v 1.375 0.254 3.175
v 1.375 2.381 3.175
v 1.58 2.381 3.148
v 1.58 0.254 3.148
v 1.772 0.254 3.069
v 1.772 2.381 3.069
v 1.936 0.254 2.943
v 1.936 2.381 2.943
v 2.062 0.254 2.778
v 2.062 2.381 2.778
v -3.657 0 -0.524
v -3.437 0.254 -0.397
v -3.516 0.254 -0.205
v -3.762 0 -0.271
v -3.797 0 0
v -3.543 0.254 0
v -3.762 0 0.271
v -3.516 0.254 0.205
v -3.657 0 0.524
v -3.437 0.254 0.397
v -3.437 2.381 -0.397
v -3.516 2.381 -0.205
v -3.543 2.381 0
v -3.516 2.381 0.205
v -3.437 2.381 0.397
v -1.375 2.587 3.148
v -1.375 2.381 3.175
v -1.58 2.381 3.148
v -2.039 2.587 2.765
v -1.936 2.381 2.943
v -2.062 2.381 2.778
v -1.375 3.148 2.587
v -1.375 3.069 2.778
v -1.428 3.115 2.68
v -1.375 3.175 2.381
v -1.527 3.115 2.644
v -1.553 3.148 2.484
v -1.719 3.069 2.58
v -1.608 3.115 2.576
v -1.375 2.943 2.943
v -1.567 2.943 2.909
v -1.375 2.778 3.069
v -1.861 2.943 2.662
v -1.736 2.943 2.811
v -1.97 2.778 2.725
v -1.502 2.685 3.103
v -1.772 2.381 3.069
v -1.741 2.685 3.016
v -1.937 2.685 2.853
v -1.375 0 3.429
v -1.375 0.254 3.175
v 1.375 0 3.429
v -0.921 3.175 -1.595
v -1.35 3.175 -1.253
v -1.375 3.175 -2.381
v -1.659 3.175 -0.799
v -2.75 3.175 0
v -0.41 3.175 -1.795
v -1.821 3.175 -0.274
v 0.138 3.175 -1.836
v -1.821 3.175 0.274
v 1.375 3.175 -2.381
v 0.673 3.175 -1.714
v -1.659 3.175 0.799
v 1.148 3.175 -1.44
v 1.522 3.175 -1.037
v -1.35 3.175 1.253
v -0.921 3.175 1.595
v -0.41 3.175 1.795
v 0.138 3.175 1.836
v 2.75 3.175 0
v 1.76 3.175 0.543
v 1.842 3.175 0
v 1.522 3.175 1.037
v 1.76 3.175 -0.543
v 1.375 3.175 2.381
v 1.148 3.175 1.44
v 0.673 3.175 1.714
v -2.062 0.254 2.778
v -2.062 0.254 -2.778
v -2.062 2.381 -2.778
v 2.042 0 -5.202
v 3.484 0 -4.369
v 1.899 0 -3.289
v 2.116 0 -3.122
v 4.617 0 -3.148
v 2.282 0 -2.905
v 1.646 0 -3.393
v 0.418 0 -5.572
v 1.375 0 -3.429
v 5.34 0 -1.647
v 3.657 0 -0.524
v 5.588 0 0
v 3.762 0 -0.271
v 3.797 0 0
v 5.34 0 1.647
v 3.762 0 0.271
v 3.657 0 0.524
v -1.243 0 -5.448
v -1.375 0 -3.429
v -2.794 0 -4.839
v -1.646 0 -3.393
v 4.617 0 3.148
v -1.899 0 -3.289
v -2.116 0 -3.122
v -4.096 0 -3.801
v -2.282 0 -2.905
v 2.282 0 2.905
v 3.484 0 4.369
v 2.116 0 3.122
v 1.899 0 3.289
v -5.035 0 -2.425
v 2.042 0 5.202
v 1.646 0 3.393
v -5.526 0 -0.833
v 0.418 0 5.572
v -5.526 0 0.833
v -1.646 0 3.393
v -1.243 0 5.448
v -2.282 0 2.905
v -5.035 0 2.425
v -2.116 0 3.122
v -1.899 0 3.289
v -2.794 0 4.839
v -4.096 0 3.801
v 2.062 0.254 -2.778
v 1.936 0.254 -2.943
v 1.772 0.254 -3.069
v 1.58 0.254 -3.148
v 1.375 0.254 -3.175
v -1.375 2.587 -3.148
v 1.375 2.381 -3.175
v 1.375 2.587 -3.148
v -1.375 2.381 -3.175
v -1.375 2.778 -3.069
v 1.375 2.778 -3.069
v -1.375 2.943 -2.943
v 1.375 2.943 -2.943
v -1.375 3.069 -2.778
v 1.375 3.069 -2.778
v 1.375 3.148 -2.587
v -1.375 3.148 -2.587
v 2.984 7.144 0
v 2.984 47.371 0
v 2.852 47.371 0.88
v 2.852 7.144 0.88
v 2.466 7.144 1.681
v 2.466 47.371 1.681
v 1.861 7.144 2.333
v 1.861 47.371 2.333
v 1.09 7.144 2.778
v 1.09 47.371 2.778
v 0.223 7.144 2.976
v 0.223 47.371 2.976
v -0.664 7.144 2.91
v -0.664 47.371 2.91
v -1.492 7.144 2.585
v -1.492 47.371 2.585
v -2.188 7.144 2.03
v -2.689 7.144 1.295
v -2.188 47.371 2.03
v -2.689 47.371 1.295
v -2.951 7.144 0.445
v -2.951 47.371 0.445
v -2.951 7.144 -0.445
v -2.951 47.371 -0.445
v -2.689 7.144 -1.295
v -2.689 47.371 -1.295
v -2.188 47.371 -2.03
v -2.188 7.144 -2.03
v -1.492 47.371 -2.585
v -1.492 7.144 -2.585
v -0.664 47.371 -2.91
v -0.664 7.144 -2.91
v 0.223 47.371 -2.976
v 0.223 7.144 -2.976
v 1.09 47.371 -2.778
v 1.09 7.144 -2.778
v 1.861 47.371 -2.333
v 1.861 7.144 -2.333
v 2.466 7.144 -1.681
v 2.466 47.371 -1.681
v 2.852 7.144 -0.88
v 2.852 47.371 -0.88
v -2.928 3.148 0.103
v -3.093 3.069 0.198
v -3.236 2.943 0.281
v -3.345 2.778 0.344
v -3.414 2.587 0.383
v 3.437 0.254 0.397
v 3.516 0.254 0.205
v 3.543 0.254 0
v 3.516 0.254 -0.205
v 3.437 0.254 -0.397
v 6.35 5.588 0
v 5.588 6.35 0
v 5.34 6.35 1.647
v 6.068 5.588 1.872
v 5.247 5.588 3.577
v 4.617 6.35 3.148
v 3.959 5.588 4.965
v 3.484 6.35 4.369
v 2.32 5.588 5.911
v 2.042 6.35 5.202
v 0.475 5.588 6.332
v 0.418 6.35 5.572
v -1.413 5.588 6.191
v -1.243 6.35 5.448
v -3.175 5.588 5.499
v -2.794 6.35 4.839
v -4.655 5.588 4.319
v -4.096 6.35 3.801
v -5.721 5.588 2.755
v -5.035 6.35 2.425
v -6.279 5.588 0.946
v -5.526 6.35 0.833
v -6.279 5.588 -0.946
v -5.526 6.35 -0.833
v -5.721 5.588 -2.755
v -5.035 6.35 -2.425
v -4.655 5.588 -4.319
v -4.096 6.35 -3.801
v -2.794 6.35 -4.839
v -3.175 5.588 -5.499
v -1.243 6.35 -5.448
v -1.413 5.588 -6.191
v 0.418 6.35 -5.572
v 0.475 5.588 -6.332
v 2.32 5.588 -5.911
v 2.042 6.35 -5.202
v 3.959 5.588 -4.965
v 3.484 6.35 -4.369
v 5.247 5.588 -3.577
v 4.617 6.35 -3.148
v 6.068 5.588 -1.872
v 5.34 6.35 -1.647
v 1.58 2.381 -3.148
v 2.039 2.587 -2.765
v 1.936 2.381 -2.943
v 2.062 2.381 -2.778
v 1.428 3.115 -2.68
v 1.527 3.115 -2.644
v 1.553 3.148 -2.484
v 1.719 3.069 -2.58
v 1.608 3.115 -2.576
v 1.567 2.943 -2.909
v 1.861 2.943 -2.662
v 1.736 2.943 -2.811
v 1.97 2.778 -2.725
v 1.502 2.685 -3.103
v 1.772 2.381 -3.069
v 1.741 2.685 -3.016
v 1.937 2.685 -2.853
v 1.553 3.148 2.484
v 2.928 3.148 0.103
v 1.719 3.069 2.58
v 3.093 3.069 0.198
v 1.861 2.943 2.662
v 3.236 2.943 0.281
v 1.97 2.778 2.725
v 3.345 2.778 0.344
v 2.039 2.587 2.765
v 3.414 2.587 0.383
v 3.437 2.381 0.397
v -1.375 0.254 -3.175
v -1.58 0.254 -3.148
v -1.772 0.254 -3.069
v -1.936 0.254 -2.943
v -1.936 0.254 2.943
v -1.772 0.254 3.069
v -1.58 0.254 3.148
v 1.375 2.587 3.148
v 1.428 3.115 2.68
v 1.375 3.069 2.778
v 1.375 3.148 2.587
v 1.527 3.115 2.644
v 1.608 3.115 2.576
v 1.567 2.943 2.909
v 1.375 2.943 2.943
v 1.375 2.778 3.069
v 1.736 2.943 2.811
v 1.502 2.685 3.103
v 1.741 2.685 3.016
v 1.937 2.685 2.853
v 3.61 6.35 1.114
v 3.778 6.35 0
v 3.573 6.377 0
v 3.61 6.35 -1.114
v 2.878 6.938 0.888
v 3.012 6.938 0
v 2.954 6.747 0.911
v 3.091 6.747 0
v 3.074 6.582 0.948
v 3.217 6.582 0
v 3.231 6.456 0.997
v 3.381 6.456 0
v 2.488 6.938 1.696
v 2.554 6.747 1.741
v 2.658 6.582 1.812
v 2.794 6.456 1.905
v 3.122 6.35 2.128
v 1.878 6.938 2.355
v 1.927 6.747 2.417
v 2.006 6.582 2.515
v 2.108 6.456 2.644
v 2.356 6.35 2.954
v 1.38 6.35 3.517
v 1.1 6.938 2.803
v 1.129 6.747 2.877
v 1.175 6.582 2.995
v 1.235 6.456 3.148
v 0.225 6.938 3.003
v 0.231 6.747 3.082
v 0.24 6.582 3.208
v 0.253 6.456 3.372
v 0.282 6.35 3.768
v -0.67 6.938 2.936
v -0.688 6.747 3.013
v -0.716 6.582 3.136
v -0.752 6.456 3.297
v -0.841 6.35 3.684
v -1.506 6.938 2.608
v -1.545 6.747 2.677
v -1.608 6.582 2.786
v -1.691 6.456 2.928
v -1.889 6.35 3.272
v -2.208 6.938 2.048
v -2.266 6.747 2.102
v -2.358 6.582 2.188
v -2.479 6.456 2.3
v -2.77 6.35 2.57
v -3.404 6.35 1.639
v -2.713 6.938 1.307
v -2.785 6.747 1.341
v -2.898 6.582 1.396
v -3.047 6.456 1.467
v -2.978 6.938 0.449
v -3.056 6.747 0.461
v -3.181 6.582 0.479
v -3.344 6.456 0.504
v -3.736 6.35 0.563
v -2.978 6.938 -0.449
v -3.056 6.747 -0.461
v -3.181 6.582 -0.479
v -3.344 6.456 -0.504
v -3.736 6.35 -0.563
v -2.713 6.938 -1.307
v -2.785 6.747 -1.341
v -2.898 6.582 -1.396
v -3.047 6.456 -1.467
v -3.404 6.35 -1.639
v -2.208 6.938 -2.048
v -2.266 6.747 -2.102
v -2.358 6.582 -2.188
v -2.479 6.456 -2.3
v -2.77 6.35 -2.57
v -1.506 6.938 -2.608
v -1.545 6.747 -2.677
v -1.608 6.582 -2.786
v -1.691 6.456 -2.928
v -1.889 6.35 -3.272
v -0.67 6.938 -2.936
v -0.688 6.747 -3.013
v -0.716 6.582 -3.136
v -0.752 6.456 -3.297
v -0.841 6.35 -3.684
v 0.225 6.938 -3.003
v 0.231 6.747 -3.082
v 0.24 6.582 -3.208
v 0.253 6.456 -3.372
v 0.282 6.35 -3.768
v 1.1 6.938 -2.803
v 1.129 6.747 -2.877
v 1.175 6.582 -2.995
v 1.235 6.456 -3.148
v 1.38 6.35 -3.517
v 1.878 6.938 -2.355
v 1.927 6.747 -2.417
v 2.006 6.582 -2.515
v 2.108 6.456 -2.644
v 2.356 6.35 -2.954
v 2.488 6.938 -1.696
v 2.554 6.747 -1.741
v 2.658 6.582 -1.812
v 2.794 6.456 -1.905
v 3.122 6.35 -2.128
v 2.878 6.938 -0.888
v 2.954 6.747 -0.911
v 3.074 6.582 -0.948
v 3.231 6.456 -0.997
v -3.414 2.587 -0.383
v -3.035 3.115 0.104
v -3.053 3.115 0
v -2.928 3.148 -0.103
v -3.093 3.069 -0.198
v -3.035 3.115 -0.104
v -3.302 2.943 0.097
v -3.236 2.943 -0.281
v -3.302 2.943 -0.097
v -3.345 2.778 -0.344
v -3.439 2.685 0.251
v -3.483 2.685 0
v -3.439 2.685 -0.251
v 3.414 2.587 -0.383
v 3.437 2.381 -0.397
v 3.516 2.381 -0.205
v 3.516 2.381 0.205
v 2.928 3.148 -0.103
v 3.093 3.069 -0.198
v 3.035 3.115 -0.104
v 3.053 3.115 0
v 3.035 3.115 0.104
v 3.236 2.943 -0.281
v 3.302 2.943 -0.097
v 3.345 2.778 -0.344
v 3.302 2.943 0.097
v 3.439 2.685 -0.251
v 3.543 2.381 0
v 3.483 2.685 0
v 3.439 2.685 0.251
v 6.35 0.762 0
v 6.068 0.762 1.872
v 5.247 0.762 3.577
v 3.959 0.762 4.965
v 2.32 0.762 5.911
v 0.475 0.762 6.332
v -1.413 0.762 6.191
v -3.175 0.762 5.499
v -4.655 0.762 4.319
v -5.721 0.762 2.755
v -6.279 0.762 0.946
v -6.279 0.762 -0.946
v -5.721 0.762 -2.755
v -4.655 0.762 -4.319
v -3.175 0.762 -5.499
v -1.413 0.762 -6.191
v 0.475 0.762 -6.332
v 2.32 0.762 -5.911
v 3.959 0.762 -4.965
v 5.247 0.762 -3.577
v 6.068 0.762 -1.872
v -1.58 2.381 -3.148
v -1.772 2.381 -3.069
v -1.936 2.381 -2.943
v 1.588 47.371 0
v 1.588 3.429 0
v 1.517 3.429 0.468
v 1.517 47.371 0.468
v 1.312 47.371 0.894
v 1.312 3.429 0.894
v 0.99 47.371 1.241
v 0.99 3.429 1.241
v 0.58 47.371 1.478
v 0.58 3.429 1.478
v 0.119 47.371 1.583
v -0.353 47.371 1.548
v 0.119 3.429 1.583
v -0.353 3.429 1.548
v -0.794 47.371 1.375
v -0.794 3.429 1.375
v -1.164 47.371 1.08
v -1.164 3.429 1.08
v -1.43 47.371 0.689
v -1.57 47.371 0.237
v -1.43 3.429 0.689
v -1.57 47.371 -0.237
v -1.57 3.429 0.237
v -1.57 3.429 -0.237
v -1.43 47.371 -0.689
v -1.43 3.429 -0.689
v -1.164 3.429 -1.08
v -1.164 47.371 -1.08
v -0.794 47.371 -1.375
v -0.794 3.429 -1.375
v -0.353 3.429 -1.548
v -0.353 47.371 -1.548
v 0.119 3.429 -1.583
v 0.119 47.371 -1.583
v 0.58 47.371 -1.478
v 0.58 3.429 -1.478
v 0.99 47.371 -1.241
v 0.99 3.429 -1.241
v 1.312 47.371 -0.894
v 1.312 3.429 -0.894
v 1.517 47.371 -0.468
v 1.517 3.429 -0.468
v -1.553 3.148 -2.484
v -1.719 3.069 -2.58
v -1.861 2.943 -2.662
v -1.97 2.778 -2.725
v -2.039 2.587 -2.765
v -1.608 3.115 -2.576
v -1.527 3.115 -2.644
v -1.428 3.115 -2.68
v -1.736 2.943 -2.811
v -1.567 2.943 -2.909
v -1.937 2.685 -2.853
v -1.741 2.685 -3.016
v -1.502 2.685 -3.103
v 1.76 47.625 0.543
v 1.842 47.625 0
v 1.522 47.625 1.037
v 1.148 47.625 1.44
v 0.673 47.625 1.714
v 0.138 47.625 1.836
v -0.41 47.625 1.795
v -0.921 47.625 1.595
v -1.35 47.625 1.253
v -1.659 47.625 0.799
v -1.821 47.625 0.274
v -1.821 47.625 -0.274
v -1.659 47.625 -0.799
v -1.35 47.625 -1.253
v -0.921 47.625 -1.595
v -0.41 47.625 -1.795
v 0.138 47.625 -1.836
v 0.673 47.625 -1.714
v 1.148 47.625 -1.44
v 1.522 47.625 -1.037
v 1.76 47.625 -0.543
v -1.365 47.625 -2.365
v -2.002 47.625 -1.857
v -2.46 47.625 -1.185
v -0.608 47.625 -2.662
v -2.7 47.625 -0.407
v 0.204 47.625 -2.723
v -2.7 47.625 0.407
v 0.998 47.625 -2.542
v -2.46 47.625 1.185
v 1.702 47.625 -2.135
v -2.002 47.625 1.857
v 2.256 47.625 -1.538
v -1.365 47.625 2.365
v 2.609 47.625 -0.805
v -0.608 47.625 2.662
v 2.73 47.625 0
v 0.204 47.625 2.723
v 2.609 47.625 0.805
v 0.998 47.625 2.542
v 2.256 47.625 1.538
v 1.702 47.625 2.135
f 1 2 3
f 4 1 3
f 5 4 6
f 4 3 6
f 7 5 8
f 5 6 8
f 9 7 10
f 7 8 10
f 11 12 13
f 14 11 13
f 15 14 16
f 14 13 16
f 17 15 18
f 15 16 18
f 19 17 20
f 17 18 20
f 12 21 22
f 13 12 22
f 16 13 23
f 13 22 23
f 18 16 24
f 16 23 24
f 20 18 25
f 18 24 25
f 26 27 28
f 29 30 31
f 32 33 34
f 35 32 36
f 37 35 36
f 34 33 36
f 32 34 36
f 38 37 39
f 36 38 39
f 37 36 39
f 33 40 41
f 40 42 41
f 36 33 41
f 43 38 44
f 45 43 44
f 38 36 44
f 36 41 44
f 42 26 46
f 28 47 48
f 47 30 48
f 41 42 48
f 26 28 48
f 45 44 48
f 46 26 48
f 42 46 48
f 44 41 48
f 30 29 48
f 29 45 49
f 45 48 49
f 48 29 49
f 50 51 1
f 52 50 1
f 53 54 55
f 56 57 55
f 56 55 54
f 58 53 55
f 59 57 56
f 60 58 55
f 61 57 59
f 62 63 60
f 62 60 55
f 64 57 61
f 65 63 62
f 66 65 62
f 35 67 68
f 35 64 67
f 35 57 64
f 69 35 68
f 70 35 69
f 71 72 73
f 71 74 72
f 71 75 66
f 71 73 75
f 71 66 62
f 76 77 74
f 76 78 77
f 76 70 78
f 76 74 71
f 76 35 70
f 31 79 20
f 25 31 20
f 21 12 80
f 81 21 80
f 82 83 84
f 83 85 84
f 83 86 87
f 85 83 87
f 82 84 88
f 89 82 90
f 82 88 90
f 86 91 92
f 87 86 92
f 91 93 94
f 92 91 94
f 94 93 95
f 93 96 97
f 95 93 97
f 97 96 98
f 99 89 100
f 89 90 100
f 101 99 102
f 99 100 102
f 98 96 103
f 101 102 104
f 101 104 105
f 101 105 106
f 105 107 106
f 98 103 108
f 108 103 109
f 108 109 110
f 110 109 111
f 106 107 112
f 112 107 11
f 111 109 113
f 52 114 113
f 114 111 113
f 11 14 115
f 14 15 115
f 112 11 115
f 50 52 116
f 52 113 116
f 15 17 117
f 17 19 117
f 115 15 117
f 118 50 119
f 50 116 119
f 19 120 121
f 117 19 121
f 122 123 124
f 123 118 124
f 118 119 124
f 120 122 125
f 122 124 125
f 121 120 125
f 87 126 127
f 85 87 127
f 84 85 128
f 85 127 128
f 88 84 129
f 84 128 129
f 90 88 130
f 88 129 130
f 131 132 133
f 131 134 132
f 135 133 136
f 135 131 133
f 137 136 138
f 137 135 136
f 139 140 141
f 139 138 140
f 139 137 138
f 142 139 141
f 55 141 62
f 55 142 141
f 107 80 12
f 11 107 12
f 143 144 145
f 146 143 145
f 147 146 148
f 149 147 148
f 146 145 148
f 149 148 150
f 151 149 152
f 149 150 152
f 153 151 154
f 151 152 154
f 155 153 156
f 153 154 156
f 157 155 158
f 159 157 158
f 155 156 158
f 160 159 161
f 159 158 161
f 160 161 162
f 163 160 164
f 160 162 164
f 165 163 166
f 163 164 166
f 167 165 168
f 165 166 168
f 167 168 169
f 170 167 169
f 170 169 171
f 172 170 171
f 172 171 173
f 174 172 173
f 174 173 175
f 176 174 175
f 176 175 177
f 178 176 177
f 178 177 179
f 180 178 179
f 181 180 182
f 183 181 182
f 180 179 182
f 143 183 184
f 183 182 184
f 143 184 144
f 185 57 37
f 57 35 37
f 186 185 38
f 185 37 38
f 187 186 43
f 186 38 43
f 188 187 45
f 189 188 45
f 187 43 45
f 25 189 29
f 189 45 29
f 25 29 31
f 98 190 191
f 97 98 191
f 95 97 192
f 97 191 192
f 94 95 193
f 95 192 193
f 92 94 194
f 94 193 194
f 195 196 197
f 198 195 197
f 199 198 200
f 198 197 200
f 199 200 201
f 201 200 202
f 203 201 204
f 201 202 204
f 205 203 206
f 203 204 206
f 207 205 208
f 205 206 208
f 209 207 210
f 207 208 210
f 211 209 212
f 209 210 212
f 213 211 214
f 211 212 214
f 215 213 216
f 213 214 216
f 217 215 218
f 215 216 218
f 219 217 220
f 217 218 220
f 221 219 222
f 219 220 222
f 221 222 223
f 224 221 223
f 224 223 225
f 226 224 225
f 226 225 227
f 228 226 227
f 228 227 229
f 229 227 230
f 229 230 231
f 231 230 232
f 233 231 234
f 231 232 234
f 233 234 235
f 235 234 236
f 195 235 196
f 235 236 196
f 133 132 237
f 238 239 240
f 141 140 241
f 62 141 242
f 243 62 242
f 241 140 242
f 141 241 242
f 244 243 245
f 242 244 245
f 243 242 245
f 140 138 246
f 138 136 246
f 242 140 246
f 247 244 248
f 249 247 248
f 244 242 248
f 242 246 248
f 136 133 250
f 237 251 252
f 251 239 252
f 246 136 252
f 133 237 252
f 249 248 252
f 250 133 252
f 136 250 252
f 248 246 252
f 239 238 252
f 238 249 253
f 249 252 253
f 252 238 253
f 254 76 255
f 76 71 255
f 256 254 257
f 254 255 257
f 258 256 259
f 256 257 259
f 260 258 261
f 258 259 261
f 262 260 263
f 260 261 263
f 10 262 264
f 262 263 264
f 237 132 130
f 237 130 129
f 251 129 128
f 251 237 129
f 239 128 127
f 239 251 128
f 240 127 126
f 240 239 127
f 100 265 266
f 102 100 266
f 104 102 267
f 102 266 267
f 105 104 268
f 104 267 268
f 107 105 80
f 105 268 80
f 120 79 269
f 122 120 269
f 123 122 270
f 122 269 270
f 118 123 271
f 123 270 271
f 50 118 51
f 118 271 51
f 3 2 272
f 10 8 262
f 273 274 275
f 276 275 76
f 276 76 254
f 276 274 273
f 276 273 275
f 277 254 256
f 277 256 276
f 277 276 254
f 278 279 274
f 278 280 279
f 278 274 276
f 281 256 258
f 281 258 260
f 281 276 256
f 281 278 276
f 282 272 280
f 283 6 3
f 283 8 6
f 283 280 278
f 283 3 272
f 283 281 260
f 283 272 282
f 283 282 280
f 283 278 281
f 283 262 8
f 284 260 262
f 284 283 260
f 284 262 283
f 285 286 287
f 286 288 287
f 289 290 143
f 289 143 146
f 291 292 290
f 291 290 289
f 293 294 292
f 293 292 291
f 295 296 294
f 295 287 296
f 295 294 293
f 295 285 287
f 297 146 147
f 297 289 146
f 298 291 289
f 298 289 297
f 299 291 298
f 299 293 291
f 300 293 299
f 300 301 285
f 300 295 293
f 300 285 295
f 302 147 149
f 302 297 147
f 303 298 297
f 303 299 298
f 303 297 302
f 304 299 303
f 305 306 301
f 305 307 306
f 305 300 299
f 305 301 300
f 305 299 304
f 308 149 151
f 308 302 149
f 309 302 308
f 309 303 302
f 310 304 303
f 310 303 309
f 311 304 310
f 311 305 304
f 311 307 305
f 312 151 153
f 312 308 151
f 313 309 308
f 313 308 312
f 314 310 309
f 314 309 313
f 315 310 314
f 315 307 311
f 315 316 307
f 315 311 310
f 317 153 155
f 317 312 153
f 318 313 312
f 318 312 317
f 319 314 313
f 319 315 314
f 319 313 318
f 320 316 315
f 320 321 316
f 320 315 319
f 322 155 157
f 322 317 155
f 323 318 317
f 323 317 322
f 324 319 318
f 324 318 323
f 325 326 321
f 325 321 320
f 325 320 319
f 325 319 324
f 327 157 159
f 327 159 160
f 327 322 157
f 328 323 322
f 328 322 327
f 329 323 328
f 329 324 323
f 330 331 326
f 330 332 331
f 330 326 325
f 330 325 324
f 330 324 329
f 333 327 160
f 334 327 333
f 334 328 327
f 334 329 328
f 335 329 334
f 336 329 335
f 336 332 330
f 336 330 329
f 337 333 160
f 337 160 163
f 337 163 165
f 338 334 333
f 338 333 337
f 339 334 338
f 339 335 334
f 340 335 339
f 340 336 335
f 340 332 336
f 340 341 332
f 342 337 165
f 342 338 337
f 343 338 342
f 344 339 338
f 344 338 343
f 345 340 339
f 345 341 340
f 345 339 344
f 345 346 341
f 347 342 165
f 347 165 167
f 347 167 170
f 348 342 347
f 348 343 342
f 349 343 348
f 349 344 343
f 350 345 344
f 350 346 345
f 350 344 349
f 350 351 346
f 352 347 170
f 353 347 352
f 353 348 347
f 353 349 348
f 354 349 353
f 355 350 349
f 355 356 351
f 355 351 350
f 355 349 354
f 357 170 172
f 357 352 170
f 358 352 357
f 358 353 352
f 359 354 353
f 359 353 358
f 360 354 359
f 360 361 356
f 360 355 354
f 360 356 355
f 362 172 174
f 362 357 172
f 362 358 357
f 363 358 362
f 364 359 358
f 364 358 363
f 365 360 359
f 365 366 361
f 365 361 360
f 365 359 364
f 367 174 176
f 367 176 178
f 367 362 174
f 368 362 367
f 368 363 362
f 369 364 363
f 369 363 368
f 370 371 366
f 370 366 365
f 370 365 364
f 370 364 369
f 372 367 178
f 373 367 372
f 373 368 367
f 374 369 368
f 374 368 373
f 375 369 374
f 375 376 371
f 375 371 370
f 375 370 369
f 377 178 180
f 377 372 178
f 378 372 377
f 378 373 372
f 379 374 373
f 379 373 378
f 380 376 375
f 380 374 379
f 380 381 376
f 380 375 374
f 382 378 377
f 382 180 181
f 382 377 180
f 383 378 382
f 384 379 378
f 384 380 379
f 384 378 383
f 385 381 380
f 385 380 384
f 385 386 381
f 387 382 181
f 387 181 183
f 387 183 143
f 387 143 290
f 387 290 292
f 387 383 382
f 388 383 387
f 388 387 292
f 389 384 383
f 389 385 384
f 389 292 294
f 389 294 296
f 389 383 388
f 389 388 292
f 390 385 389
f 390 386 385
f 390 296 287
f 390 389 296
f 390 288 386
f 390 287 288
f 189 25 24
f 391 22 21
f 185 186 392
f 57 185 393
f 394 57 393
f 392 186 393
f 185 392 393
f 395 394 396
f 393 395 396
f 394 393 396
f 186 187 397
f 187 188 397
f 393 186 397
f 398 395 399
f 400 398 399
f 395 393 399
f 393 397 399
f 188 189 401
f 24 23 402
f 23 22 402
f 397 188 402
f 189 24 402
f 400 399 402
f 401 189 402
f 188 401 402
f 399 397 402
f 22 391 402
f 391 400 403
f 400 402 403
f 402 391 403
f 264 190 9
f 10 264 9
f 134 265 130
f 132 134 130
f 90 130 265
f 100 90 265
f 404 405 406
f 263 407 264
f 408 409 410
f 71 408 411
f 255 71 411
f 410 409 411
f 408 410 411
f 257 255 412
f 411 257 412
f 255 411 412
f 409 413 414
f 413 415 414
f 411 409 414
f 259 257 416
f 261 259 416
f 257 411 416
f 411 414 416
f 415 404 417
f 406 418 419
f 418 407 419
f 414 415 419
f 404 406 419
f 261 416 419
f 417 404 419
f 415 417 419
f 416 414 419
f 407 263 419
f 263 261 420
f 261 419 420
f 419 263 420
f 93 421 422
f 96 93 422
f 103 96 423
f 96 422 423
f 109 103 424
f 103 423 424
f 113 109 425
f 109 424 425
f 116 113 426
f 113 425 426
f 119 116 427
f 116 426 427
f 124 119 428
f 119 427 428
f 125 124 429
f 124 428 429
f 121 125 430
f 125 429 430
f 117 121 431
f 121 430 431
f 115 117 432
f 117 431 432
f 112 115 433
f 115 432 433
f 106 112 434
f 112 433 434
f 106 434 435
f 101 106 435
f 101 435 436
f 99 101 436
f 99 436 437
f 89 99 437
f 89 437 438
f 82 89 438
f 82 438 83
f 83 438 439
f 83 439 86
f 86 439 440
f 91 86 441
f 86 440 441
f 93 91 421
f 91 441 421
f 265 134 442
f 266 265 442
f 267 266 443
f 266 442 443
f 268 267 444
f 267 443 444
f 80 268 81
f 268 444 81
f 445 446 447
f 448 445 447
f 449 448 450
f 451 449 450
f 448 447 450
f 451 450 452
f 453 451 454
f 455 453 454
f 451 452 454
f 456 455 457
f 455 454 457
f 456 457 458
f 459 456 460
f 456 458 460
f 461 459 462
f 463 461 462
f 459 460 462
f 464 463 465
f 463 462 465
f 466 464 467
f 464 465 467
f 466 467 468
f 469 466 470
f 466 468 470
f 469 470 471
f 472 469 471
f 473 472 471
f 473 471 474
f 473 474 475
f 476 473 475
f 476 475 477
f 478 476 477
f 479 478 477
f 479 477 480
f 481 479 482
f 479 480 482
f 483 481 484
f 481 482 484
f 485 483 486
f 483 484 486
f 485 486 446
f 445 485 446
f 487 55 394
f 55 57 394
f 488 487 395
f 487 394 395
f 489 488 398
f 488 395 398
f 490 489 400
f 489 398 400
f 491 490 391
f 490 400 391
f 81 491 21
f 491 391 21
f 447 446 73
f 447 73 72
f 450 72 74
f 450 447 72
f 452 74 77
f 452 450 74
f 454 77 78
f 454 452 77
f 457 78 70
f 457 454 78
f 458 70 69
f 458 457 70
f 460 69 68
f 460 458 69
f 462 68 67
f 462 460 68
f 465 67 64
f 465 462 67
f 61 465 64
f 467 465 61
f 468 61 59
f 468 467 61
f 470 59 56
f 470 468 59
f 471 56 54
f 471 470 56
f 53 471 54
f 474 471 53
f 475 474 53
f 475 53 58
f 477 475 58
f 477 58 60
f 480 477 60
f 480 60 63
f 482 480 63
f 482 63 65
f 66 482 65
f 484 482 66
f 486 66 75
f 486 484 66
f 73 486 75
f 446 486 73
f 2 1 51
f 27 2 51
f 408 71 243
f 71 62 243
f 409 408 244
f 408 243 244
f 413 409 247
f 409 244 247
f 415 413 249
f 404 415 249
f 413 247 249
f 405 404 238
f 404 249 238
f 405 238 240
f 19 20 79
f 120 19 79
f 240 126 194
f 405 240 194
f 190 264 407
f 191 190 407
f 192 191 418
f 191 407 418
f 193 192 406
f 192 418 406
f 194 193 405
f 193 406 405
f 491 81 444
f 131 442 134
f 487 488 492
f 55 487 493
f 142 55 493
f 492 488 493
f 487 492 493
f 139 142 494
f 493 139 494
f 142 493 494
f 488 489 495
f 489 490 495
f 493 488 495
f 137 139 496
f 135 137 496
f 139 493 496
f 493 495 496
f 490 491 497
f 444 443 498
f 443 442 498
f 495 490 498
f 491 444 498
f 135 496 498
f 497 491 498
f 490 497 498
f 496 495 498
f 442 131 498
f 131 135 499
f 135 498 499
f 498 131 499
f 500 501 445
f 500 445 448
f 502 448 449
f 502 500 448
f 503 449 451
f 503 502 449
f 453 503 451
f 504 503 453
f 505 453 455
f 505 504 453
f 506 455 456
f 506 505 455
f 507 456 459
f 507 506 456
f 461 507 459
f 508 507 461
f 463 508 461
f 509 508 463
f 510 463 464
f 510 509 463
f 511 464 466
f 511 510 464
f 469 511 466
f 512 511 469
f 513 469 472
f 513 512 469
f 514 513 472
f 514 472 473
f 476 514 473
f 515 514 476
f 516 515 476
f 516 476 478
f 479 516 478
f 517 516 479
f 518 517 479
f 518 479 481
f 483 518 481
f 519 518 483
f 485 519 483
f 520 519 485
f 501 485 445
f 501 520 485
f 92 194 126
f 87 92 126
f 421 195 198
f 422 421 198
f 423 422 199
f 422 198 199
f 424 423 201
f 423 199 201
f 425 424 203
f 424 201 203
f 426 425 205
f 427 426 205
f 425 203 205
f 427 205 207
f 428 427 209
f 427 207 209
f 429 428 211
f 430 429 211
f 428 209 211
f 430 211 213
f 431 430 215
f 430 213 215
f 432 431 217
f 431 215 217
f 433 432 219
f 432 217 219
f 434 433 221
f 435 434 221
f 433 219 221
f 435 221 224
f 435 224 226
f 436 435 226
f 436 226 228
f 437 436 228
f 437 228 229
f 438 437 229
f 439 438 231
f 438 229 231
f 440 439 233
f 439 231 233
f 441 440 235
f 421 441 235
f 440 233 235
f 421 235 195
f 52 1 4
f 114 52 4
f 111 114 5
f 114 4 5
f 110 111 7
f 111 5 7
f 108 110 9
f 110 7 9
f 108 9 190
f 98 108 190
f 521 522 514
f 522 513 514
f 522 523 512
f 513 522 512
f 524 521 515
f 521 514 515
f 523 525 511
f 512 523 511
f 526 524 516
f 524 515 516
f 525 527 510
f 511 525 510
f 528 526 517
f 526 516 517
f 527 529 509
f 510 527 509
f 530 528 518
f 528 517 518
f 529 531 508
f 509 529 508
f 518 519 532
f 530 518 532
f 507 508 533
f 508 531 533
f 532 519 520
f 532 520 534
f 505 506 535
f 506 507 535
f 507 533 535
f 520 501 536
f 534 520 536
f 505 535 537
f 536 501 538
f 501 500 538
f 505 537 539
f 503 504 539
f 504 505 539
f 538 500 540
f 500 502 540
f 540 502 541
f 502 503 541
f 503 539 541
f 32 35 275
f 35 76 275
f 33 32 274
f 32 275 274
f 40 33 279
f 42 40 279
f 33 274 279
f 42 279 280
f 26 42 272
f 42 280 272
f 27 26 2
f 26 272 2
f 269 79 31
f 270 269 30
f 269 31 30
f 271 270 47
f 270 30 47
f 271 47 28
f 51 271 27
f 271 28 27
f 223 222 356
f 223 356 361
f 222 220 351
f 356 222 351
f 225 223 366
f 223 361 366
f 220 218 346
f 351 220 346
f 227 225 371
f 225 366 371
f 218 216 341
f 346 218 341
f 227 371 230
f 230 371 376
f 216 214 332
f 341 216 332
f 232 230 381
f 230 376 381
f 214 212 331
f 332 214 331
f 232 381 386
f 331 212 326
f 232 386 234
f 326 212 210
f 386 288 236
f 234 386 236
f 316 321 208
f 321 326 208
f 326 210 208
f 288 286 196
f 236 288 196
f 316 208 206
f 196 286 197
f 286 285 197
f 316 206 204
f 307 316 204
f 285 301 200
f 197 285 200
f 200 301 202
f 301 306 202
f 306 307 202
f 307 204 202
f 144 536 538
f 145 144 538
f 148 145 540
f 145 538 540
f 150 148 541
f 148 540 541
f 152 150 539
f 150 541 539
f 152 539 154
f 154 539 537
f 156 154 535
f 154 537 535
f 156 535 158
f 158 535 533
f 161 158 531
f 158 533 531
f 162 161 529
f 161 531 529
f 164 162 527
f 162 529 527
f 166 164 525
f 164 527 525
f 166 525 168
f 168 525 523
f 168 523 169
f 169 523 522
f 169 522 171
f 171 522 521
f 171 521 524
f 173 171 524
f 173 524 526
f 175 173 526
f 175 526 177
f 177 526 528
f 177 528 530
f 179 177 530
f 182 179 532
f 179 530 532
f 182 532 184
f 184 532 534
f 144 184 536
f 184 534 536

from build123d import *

# Parameters (mm, degrees)
CUT_EXTRUDE1_DEPTH = 3.175
FILLET1_R          = 0.79375
CHAMFER1_SIZE      = 0.254
CHAMFER2_SIZE      = 0.762


with BuildPart() as part:
    # Sketch1 → Revolve1 (revolve)
    with BuildSketch(Plane.XY):
        Polygon((3.175, 0), (6.35, 0), (6.35, 6.35), (2.9845, 6.35), (2.9845, 47.625), (1.5875, 47.625), (1.5875, 3.175), (3.175, 3.175), align=None)
    revolve(axis=Axis((0, 5.569325848, 0), (0, -1, 0)))

    # Sketch2 → Cut-Extrude1 (cut)
    with BuildSketch(Plane.XZ):
        Polygon((1.833087105, 3.175), (-1.833087105, 3.175), (-3.666174209, 0), (-1.833087105, -3.175), (1.833087105, -3.175), (3.666174209, 0), align=None)
    extrude(amount=-CUT_EXTRUDE1_DEPTH, mode=Mode.SUBTRACT)

    # Fillet1
    fillet1_edges = [part.edges().sort_by_distance(p)[0] for p in [
        (0, 3.175, 3.175),
        (-2.749630657, 3.175, 1.5875),
        (-2.749630657, 3.175, -1.5875),
        (0, 3.175, -3.175),
        (2.749630657, 3.175, -1.5875),
        (2.749630657, 3.175, 1.5875),
        (-1.833087105, 1.5875, 3.175),
        (-3.666174209, 1.5875, 0),
        (-1.833087105, 1.5875, -3.175),
        (1.833087105, 1.5875, -3.175),
        (3.666174209, 1.5875, 0),
        (1.833087105, 1.5875, 3.175),
        (-2.9845, 6.35, 0),
    ]]
    fillet(fillet1_edges, radius=FILLET1_R)

    # Chamfer1
    chamfer1_edges = [part.edges().sort_by_distance(p)[0] for p in [
        (-1.5875, 3.175, 0),
        (0, 0, 3.175),
        (2.749630657, 0, 1.5875),
        (-1.5875, 47.625, 0),
        (2.749630657, 0, -1.5875),
        (0, 0, -3.175),
        (-2.9845, 47.625, 0),
        (-2.749630657, 0, -1.5875),
        (-2.749630657, 0, 1.5875),
        (-1.771690329, 0, 3.068657664),
        (1.771690329, 0, 3.068657664),
        (3.543380657, 0, 0),
        (1.771690329, 0, -3.068657664),
        (-1.771690329, 0, -3.068657664),
        (-3.543380657, 0, 0),
    ]]
    chamfer(chamfer1_edges, length=CHAMFER1_SIZE)

    # Chamfer2
    chamfer2_edges = [part.edges().sort_by_distance(p)[0] for p in [
        (-6.35, 6.35, 0),
        (-6.35, 0, 0),
    ]]
    chamfer(chamfer2_edges, length=CHAMFER2_SIZE)


solid = part.part
